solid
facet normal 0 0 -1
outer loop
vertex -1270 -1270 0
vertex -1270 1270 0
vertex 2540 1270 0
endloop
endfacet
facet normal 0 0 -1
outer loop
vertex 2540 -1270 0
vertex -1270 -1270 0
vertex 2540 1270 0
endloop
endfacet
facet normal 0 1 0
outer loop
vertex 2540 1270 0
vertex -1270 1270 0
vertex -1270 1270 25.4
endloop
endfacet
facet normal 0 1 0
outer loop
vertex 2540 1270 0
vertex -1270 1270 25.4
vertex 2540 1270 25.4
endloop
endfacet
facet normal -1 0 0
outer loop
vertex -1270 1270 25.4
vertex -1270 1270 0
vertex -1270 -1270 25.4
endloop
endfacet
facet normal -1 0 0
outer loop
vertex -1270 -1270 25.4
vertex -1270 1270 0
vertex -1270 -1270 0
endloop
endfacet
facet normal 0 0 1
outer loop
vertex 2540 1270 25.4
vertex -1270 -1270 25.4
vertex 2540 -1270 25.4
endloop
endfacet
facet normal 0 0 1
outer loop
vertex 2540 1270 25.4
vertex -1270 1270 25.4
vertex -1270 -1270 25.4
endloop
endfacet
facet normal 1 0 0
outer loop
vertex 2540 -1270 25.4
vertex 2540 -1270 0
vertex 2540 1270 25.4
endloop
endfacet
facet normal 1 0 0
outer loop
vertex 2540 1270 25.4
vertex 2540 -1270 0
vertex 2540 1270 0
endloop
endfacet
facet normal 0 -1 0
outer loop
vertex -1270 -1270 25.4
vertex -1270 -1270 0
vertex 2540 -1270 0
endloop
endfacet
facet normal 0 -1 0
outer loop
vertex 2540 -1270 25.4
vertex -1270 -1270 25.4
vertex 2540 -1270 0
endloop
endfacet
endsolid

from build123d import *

# Parameters (mm, degrees)
F0_W     = 508
F0_H     = 381
F1_DEPTH = 25.4
F0_W_2   = 254
F0_H_2   = 254
F2_DEPTH = 25.4
F0_W_3   = 381
F0_H_3   = 127
F3_DEPTH = 25.4
F4_DEPTH = 25.4
F0_W_4   = 127
F0_H_4   = 508
F0_W_5   = 635
F5_DEPTH = 25.4
F6_DEPTH = 25.4
F7_DEPTH = 25.4


# Not quite as in the source:
# - a feature names something its author has since deleted; it is built from what else it names


with BuildPart() as f1:
    # F0 (on Top) → F1 (new body)
    with BuildSketch(Plane.XY):
        with Locations((-1016, 1079.5)):
            Rectangle(F0_W, F0_H)
    extrude(amount=F1_DEPTH)

    # F0 (on Top) → F2 (join)
    with BuildSketch(Plane.XY):
        Polygon((-127, 1270), (-762, 1270), (-762, 889), (-762, 508), (-127, 508), (-127, 762), align=None)
        Polygon((127, 1270), (-127, 1270), (-127, 762), (127, 762), (127, 889), align=None)
        Polygon((889, 1270), (127, 1270), (127, 889), (508, 889), (889, 889), align=None)
        Polygon((1397, 1270), (889, 1270), (889, 889), (889, 635), (1270, 635), (1397, 635), (1397, 889), align=None)
        with Locations((1651, 1079.5)):
            Rectangle(F0_W, F0_H)
        Polygon((2540, 1270), (1905, 1270), (1905, 889), (1905, 381), (2286, 381), (2540, 381), align=None)
        Polygon((-762, 889), (-1270, 889), (-1270, 508), (-1016, 508), (-762, 508), align=None)
        Polygon((-127, 508), (-762, 508), (-762, 381), (-127, 381), (508, 381), (508, 508), (127, 508), align=None)
        with Locations((0, 635)):
            Rectangle(F0_W_2, F0_H_2)
        Polygon((127, 889), (127, 762), (127, 508), (508, 508), (508, 889), align=None)
        Polygon((889, 889), (508, 889), (508, 508), (508, 381), (508, 254), (889, 254), (889, 635), align=None)
        Polygon((1270, 635), (889, 635), (889, 254), (889, 127), (1270, 127), align=None)
        Polygon((1397, 635), (1270, 635), (1270, 127), (1270, -127), (1270, -381), (1397, -381), (1397, 0), align=None)
        Polygon((1905, 889), (1397, 889), (1397, 635), (1397, 0), (1651, 0), (1905, 0), (1905, 381), align=None)
        Polygon((2286, 381), (1905, 381), (1905, 0), (1905, -254), (2286, -254), align=None)
        Polygon((2540, -508), (2540, 381), (2286, 381), (2286, -254), (2286, -508), align=None)
    extrude(amount=F2_DEPTH)

    # F0 (on Top) → F3 (join)
    with BuildSketch(Plane.XY):
        Polygon((-1016, 508), (-1270, 508), (-1270, -254), (-1016, -254), (-1016, 254), align=None)
        Polygon((-762, 381), (-762, 508), (-1016, 508), (-1016, 254), (-889, 254), (-762, 254), align=None)
        Polygon((-127, 381), (-762, 381), (-762, 254), (-762, -254), (-127, -254), (-127, 0), align=None)
        Polygon((508, 381), (-127, 381), (-127, 0), (254, 0), (508, 0), (508, 127), (508, 254), align=None)
        with Locations((698.5, 190.5)):
            Rectangle(F0_W_3, F0_H_3)
        Polygon((889, 127), (508, 127), (508, 0), (508, -127), (889, -127), (1270, -127), (1270, 127), align=None)
        with Locations((1079.5, -254)):
            Rectangle(F0_W_3, F0_H_2)
        Polygon((1524, -1016), (1524, -1270), (2032, -1270), (2032, -1016), (1905, -1016), (1651, -1016), align=None)
        Polygon((1651, -381), (1397, -381), (1270, -381), (889, -381), (889, -635), (889, -1016), (1524, -1016), (1651, -1016), (1651, -508), align=None)
        Polygon((1905, -254), (1651, -254), (1651, -381), (1651, -508), (1905, -508), (2286, -508), (2286, -254), align=None)
        Polygon((2540, -1016), (2540, -508), (2286, -508), (1905, -508), (1905, -1016), (2032, -1016), align=None)
    extrude(amount=F3_DEPTH)

    # F0 (on Top) → F4 (join)
    with BuildSketch(Plane.XY):
        Polygon((1651, 0), (1397, 0), (1397, -381), (1651, -381), (1651, -254), align=None)
        with Locations((1778, -127)):
            Rectangle(F0_W_2, F0_H_2)
    extrude(amount=F4_DEPTH)

    # F0 (on Top) → F5 (join)
    with BuildSketch(Plane.XY):
        Polygon((-1016, -254), (-1270, -254), (-1270, -889), (-889, -889), (-889, -254), align=None)
        with Locations((-952.5, 0)):
            Rectangle(F0_W_4, F0_H_4)
        Polygon((-762, -254), (-762, 254), (-889, 254), (-889, -254), (-889, -889), (-762, -889), (-762, -635), align=None)
        Polygon((-127, -254), (-762, -254), (-762, -635), (-254, -635), (-127, -635), (-127, -508), align=None)
        Polygon((254, 0), (-127, 0), (-127, -254), (-127, -508), (254, -508), align=None)
        Polygon((508, 0), (254, 0), (254, -508), (254, -635), (508, -635), (508, -127), align=None)
        Polygon((889, -127), (508, -127), (508, -635), (889, -635), (889, -381), align=None)
        with Locations((1206.5, -1143)):
            Rectangle(F0_W_5, F0_H_2)
        with Locations((1778, -762)):
            Rectangle(F0_W_2, F0_H_4)
        Polygon((1524, -1016), (1524, -1270), (2032, -1270), (2032, -1016), (1905, -1016), (1651, -1016), align=None)
        with Locations((2286, -1143)):
            Rectangle(F0_W, F0_H_2)
    extrude(amount=F5_DEPTH)

    # F0 (on Top) → F6 (join)
    with BuildSketch(Plane.XY):
        Polygon((-889, -889), (-1270, -889), (-1270, -1270), (-762, -1270), (-762, -889), align=None)
        Polygon((-762, -635), (-762, -889), (-762, -1270), (-254, -1270), (-254, -889), (-254, -635), align=None)
        with Locations((-190.5, -762)):
            Rectangle(F0_W_4, F0_H_2)
        Polygon((254, -508), (-127, -508), (-127, -635), (-127, -889), (254, -889), (254, -635), align=None)
        with Locations((381, -762)):
            Rectangle(F0_W_2, F0_H_2)
        Polygon((508, -889), (508, -1270), (889, -1270), (889, -1016), (889, -635), (508, -635), align=None)
    extrude(amount=F6_DEPTH)

    # F0 (on Top) → F7 (join)
    with BuildSketch(Plane.XY):
        Polygon((-254, -889), (-254, -1270), (508, -1270), (508, -889), (254, -889), (-127, -889), align=None)
    extrude(amount=F7_DEPTH)


solid = f1.part
